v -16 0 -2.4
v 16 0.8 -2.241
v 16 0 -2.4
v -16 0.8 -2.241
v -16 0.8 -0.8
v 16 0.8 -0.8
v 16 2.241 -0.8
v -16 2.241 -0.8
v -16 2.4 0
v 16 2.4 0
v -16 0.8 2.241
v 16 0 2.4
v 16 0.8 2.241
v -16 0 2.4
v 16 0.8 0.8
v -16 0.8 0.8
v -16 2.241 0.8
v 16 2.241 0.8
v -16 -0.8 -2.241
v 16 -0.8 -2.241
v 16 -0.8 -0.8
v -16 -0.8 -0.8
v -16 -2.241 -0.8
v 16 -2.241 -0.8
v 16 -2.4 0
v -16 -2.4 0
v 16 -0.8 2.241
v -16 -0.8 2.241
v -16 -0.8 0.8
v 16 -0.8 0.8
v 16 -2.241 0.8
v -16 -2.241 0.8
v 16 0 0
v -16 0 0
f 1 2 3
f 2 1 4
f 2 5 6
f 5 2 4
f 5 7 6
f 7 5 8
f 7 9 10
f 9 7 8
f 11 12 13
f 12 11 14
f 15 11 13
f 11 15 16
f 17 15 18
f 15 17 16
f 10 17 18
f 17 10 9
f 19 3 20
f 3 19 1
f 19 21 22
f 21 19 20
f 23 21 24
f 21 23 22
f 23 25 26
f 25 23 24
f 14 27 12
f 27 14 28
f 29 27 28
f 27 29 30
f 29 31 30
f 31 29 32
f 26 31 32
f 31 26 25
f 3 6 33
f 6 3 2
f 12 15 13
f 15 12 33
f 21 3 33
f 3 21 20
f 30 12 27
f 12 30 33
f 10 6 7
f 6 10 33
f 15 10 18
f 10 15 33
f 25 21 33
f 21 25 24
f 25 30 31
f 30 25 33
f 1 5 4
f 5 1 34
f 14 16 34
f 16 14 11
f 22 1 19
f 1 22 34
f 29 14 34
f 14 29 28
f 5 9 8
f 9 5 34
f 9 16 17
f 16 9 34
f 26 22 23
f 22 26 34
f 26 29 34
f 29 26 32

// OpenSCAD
// file: ../p/axle.scad
use <../lib.scad>
function ldraw_lib__axle() = [
// 0 Axle
// 0 Name: axle.dat
// 0 Author: James Jessiman
// 0 !LDRAW_ORG Primitive UPDATE 2003-01
// 0 !LICENSE Licensed under CC BY 2.0 and CC BY 4.0 : see CAreadme.txt
// 
// 0 BFC CERTIFY CCW
  [0,"BFC","CERTIFY"],
  [0,"BFC","CCW"],
// 
// 0 !HISTORY 2000-04-23 [sbliss] Added conditional edges along outermost diameters
// 0 !HISTORY 2000-05-07 [PTadmin] Official Update 2000-01
// 0 !HISTORY 2002-11-08 [OrionP] Adjusted fit and precision
// 0 !HISTORY 2003-03-12 [PTadmin] Official Update 2003-01
// 0 !HISTORY 2007-06-24 [PTadmin] Header formatted for Contributor Agreement
// 0 !HISTORY 2008-07-01 [PTadmin] Official Update 2008-01
// 
// 
// 5 24 6 0 0 6 1 0 5.602 0 2 5.602 0 -2
  [5,24,6,0,0,6,1,0,5.602,0,2,5.602,0,-2],
// 5 24 0 0 6 0 1 6 2 0 5.602 -2 0 5.602
  [5,24,0,0,6,0,1,6,2,0,5.602,-2,0,5.602],
// 5 24 -6 0 0 -6 1 0 -5.602 0 -2 -5.602 0 2
  [5,24,-6,0,0,-6,1,0,-5.602,0,-2,-5.602,0,2],
// 5 24 0 0 -6 0 1 -6 -2 0 -5.602 2 0 -5.602
  [5,24,0,0,-6,0,1,-6,-2,0,-5.602,2,0,-5.602],
// 
// 2 24 6 0 0 5.602 0 2
  [2,24,6,0,0,5.602,0,2],
// 2 24 5.602 0 2 2 0 2
  [2,24,5.602,0,2,2,0,2],
// 2 24 2 0 2 2 0 5.602
  [2,24,2,0,2,2,0,5.602],
// 2 24 2 0 5.602 0 0 6
  [2,24,2,0,5.602,0,0,6],
// 2 24 -6 0 0 -5.602 0 2
  [2,24,-6,0,0,-5.602,0,2],
// 2 24 -5.602 0 2 -2 0 2
  [2,24,-5.602,0,2,-2,0,2],
// 2 24 -2 0 2 -2 0 5.602
  [2,24,-2,0,2,-2,0,5.602],
// 2 24 -2 0 5.602 -0 0 6
  [2,24,-2,0,5.602,-0,0,6],
// 2 24 6 0 -0 5.602 0 -2
  [2,24,6,0,-0,5.602,0,-2],
// 2 24 5.602 0 -2 2 0 -2
  [2,24,5.602,0,-2,2,0,-2],
// 2 24 2 0 -2 2 0 -5.602
  [2,24,2,0,-2,2,0,-5.602],
// 2 24 2 0 -5.602 0 0 -6
  [2,24,2,0,-5.602,0,0,-6],
// 2 24 -6 0 -0 -5.602 0 -2
  [2,24,-6,0,-0,-5.602,0,-2],
// 2 24 -5.602 0 -2 -2 0 -2
  [2,24,-5.602,0,-2,-2,0,-2],
// 2 24 -2 0 -2 -2 0 -5.602
  [2,24,-2,0,-2,-2,0,-5.602],
// 2 24 -2 0 -5.602 -0 0 -6
  [2,24,-2,0,-5.602,-0,0,-6],
// 2 24 6 1 0 5.602 1 2
  [2,24,6,1,0,5.602,1,2],
// 2 24 5.602 1 2 2 1 2
  [2,24,5.602,1,2,2,1,2],
// 2 24 2 1 2 2 1 5.602
  [2,24,2,1,2,2,1,5.602],
// 2 24 2 1 5.602 0 1 6
  [2,24,2,1,5.602,0,1,6],
// 2 24 -6 1 0 -5.602 1 2
  [2,24,-6,1,0,-5.602,1,2],
// 2 24 -5.602 1 2 -2 1 2
  [2,24,-5.602,1,2,-2,1,2],
// 2 24 -2 1 2 -2 1 5.602
  [2,24,-2,1,2,-2,1,5.602],
// 2 24 -2 1 5.602 -0 1 6
  [2,24,-2,1,5.602,-0,1,6],
// 2 24 6 1 -0 5.602 1 -2
  [2,24,6,1,-0,5.602,1,-2],
// 2 24 5.602 1 -2 2 1 -2
  [2,24,5.602,1,-2,2,1,-2],
// 2 24 2 1 -2 2 1 -5.602
  [2,24,2,1,-2,2,1,-5.602],
// 2 24 2 1 -5.602 0 1 -6
  [2,24,2,1,-5.602,0,1,-6],
// 2 24 -6 1 -0 -5.602 1 -2
  [2,24,-6,1,-0,-5.602,1,-2],
// 2 24 -5.602 1 -2 -2 1 -2
  [2,24,-5.602,1,-2,-2,1,-2],
// 2 24 -2 1 -2 -2 1 -5.602
  [2,24,-2,1,-2,-2,1,-5.602],
// 2 24 -2 1 -5.602 -0 1 -6
  [2,24,-2,1,-5.602,-0,1,-6],
// 
// 2 24 5.602 0 2 5.602 1 2
  [2,24,5.602,0,2,5.602,1,2],
// 2 24 2 0 2 2 1 2
  [2,24,2,0,2,2,1,2],
// 2 24 2 0 5.602 2 1 5.602
  [2,24,2,0,5.602,2,1,5.602],
// 2 24 -5.602 0 2 -5.602 1 2
  [2,24,-5.602,0,2,-5.602,1,2],
// 2 24 -2 0 2 -2 1 2
  [2,24,-2,0,2,-2,1,2],
// 2 24 -2 0 5.602 -2 1 5.602
  [2,24,-2,0,5.602,-2,1,5.602],
// 2 24 5.602 0 -2 5.602 1 -2
  [2,24,5.602,0,-2,5.602,1,-2],
// 2 24 2 0 -2 2 1 -2
  [2,24,2,0,-2,2,1,-2],
// 2 24 2 0 -5.602 2 1 -5.602
  [2,24,2,0,-5.602,2,1,-5.602],
// 2 24 -5.602 0 -2 -5.602 1 -2
  [2,24,-5.602,0,-2,-5.602,1,-2],
// 2 24 -2 0 -2 -2 1 -2
  [2,24,-2,0,-2,-2,1,-2],
// 2 24 -2 0 -5.602 -2 1 -5.602
  [2,24,-2,0,-5.602,-2,1,-5.602],
// 
// 4 16 6 0 0 6 1 0 5.602 1 2 5.602 0 2
  [4,16,6,0,0,6,1,0,5.602,1,2,5.602,0,2],
// 4 16 5.602 0 2 5.602 1 2 2 1 2 2 0 2
  [4,16,5.602,0,2,5.602,1,2,2,1,2,2,0,2],
// 4 16 2 0 2 2 1 2 2 1 5.602 2 0 5.602
  [4,16,2,0,2,2,1,2,2,1,5.602,2,0,5.602],
// 4 16 2 0 5.602 2 1 5.602 0 1 6 0 0 6
  [4,16,2,0,5.602,2,1,5.602,0,1,6,0,0,6],
// 4 16 -6 0 0 -5.602 0 2 -5.602 1 2 -6 1 0
  [4,16,-6,0,0,-5.602,0,2,-5.602,1,2,-6,1,0],
// 4 16 -5.602 0 2 -2 0 2 -2 1 2 -5.602 1 2
  [4,16,-5.602,0,2,-2,0,2,-2,1,2,-5.602,1,2],
// 4 16 -2 0 2 -2 0 5.602 -2 1 5.602 -2 1 2
  [4,16,-2,0,2,-2,0,5.602,-2,1,5.602,-2,1,2],
// 4 16 -2 0 5.602 -0 0 6 -0 1 6 -2 1 5.602
  [4,16,-2,0,5.602,-0,0,6,-0,1,6,-2,1,5.602],
// 4 16 6 0 -0 5.602 0 -2 5.602 1 -2 6 1 -0
  [4,16,6,0,-0,5.602,0,-2,5.602,1,-2,6,1,-0],
// 4 16 5.602 0 -2 2 0 -2 2 1 -2 5.602 1 -2
  [4,16,5.602,0,-2,2,0,-2,2,1,-2,5.602,1,-2],
// 4 16 2 0 -2 2 0 -5.602 2 1 -5.602 2 1 -2
  [4,16,2,0,-2,2,0,-5.602,2,1,-5.602,2,1,-2],
// 4 16 2 0 -5.602 0 0 -6 0 1 -6 2 1 -5.602
  [4,16,2,0,-5.602,0,0,-6,0,1,-6,2,1,-5.602],
// 4 16 -6 0 -0 -6 1 -0 -5.602 1 -2 -5.602 0 -2
  [4,16,-6,0,-0,-6,1,-0,-5.602,1,-2,-5.602,0,-2],
// 4 16 -5.602 0 -2 -5.602 1 -2 -2 1 -2 -2 0 -2
  [4,16,-5.602,0,-2,-5.602,1,-2,-2,1,-2,-2,0,-2],
// 4 16 -2 0 -2 -2 1 -2 -2 1 -5.602 -2 0 -5.602
  [4,16,-2,0,-2,-2,1,-2,-2,1,-5.602,-2,0,-5.602],
// 4 16 -2 0 -5.602 -2 1 -5.602 -0 1 -6 -0 0 -6
  [4,16,-2,0,-5.602,-2,1,-5.602,-0,1,-6,-0,0,-6],
// 
// 4 16 6 0 0 5.602 0 2 2 0 2 0 0 0
  [4,16,6,0,0,5.602,0,2,2,0,2,0,0,0],
// 4 16 -6 0 0 0 0 0 -2 0 2 -5.602 0 2
  [4,16,-6,0,0,0,0,0,-2,0,2,-5.602,0,2],
// 4 16 6 0 0 0 0 0 2 0 -2 5.602 0 -2
  [4,16,6,0,0,0,0,0,2,0,-2,5.602,0,-2],
// 4 16 -6 0 0 -5.602 0 -2 -2 0 -2 0 0 0
  [4,16,-6,0,0,-5.602,0,-2,-2,0,-2,0,0,0],
// 4 16 0 0 6 0 0 0 2 0 2 2 0 5.602
  [4,16,0,0,6,0,0,0,2,0,2,2,0,5.602],
// 4 16 0 0 6 -2 0 5.602 -2 0 2 0 0 0
  [4,16,0,0,6,-2,0,5.602,-2,0,2,0,0,0],
// 4 16 0 0 -6 2 0 -5.602 2 0 -2 0 0 0
  [4,16,0,0,-6,2,0,-5.602,2,0,-2,0,0,0],
// 4 16 0 0 -6 0 0 0 -2 0 -2 -2 0 -5.602
  [4,16,0,0,-6,0,0,0,-2,0,-2,-2,0,-5.602],
// 4 16 6 1 0 0 1 0 2 1 2 5.602 1 2
  [4,16,6,1,0,0,1,0,2,1,2,5.602,1,2],
// 4 16 -6 1 0 -5.602 1 2 -2 1 2 0 1 0
  [4,16,-6,1,0,-5.602,1,2,-2,1,2,0,1,0],
// 4 16 6 1 0 5.602 1 -2 2 1 -2 0 1 0
  [4,16,6,1,0,5.602,1,-2,2,1,-2,0,1,0],
// 4 16 -6 1 0 0 1 0 -2 1 -2 -5.602 1 -2
  [4,16,-6,1,0,0,1,0,-2,1,-2,-5.602,1,-2],
// 4 16 0 1 6 2 1 5.602 2 1 2 0 1 0
  [4,16,0,1,6,2,1,5.602,2,1,2,0,1,0],
// 4 16 0 1 6 0 1 0 -2 1 2 -2 1 5.602
  [4,16,0,1,6,0,1,0,-2,1,2,-2,1,5.602],
// 4 16 0 1 -6 0 1 0 2 1 -2 2 1 -5.602
  [4,16,0,1,-6,0,1,0,2,1,-2,2,1,-5.602],
// 4 16 0 1 -6 -2 1 -5.602 -2 1 -2 0 1 0
  [4,16,0,1,-6,-2,1,-5.602,-2,1,-2,0,1,0],
// 0
];
module ldraw_lib__axle(step=0, col=false, unit=2/5, alt=false, line=0.2, solid=!$preview)
    makepoly(ldraw_lib__axle(), step=step, col=col, unit=unit, alt=alt, line=line, solid=solid);
ldraw_lib__axle(line=0.2);
// main file
use <../lib.scad>
use <../p/axle.scad>
function ldraw_lib__3705() = [
// 0 Technic Axle  4
// 0 Name: 3705.dat
// 0 Author: James Jessiman
// 0 !LDRAW_ORG Part UPDATE 2005-01
// 0 !LICENSE Licensed under CC BY 2.0 and CC BY 4.0 : see CAreadme.txt
// 
// 0 BFC CERTIFY CCW
  [0,"BFC","CERTIFY"],
  [0,"BFC","CCW"],
// 
// 0 !HISTORY 2004-07-11 [guyvivan] BFC'ed
// 0 !HISTORY 2005-12-28 [PTadmin] Official Update 2005-01
// 0 !HISTORY 2007-06-29 [PTadmin] Header formatted for Contributor Agreement
// 0 !HISTORY 2008-07-01 [PTadmin] Official Update 2008-01
// 
// 
// 1 16 40 0 0 0 -80 0 1 0 0 0 0 1 axle.dat
  [1,16,40,0,0,0,-80,0,1,0,0,0,0,1, ldraw_lib__axle()],
// 0
// 
];
module ldraw_lib__3705(step=0, col=false, unit=2/5, alt=false, line=0.2, solid=!$preview)
    makepoly(ldraw_lib__3705(), step=step, col=col, unit=unit, alt=alt, line=line, solid=solid);
ldraw_lib__3705(line=0.2);
